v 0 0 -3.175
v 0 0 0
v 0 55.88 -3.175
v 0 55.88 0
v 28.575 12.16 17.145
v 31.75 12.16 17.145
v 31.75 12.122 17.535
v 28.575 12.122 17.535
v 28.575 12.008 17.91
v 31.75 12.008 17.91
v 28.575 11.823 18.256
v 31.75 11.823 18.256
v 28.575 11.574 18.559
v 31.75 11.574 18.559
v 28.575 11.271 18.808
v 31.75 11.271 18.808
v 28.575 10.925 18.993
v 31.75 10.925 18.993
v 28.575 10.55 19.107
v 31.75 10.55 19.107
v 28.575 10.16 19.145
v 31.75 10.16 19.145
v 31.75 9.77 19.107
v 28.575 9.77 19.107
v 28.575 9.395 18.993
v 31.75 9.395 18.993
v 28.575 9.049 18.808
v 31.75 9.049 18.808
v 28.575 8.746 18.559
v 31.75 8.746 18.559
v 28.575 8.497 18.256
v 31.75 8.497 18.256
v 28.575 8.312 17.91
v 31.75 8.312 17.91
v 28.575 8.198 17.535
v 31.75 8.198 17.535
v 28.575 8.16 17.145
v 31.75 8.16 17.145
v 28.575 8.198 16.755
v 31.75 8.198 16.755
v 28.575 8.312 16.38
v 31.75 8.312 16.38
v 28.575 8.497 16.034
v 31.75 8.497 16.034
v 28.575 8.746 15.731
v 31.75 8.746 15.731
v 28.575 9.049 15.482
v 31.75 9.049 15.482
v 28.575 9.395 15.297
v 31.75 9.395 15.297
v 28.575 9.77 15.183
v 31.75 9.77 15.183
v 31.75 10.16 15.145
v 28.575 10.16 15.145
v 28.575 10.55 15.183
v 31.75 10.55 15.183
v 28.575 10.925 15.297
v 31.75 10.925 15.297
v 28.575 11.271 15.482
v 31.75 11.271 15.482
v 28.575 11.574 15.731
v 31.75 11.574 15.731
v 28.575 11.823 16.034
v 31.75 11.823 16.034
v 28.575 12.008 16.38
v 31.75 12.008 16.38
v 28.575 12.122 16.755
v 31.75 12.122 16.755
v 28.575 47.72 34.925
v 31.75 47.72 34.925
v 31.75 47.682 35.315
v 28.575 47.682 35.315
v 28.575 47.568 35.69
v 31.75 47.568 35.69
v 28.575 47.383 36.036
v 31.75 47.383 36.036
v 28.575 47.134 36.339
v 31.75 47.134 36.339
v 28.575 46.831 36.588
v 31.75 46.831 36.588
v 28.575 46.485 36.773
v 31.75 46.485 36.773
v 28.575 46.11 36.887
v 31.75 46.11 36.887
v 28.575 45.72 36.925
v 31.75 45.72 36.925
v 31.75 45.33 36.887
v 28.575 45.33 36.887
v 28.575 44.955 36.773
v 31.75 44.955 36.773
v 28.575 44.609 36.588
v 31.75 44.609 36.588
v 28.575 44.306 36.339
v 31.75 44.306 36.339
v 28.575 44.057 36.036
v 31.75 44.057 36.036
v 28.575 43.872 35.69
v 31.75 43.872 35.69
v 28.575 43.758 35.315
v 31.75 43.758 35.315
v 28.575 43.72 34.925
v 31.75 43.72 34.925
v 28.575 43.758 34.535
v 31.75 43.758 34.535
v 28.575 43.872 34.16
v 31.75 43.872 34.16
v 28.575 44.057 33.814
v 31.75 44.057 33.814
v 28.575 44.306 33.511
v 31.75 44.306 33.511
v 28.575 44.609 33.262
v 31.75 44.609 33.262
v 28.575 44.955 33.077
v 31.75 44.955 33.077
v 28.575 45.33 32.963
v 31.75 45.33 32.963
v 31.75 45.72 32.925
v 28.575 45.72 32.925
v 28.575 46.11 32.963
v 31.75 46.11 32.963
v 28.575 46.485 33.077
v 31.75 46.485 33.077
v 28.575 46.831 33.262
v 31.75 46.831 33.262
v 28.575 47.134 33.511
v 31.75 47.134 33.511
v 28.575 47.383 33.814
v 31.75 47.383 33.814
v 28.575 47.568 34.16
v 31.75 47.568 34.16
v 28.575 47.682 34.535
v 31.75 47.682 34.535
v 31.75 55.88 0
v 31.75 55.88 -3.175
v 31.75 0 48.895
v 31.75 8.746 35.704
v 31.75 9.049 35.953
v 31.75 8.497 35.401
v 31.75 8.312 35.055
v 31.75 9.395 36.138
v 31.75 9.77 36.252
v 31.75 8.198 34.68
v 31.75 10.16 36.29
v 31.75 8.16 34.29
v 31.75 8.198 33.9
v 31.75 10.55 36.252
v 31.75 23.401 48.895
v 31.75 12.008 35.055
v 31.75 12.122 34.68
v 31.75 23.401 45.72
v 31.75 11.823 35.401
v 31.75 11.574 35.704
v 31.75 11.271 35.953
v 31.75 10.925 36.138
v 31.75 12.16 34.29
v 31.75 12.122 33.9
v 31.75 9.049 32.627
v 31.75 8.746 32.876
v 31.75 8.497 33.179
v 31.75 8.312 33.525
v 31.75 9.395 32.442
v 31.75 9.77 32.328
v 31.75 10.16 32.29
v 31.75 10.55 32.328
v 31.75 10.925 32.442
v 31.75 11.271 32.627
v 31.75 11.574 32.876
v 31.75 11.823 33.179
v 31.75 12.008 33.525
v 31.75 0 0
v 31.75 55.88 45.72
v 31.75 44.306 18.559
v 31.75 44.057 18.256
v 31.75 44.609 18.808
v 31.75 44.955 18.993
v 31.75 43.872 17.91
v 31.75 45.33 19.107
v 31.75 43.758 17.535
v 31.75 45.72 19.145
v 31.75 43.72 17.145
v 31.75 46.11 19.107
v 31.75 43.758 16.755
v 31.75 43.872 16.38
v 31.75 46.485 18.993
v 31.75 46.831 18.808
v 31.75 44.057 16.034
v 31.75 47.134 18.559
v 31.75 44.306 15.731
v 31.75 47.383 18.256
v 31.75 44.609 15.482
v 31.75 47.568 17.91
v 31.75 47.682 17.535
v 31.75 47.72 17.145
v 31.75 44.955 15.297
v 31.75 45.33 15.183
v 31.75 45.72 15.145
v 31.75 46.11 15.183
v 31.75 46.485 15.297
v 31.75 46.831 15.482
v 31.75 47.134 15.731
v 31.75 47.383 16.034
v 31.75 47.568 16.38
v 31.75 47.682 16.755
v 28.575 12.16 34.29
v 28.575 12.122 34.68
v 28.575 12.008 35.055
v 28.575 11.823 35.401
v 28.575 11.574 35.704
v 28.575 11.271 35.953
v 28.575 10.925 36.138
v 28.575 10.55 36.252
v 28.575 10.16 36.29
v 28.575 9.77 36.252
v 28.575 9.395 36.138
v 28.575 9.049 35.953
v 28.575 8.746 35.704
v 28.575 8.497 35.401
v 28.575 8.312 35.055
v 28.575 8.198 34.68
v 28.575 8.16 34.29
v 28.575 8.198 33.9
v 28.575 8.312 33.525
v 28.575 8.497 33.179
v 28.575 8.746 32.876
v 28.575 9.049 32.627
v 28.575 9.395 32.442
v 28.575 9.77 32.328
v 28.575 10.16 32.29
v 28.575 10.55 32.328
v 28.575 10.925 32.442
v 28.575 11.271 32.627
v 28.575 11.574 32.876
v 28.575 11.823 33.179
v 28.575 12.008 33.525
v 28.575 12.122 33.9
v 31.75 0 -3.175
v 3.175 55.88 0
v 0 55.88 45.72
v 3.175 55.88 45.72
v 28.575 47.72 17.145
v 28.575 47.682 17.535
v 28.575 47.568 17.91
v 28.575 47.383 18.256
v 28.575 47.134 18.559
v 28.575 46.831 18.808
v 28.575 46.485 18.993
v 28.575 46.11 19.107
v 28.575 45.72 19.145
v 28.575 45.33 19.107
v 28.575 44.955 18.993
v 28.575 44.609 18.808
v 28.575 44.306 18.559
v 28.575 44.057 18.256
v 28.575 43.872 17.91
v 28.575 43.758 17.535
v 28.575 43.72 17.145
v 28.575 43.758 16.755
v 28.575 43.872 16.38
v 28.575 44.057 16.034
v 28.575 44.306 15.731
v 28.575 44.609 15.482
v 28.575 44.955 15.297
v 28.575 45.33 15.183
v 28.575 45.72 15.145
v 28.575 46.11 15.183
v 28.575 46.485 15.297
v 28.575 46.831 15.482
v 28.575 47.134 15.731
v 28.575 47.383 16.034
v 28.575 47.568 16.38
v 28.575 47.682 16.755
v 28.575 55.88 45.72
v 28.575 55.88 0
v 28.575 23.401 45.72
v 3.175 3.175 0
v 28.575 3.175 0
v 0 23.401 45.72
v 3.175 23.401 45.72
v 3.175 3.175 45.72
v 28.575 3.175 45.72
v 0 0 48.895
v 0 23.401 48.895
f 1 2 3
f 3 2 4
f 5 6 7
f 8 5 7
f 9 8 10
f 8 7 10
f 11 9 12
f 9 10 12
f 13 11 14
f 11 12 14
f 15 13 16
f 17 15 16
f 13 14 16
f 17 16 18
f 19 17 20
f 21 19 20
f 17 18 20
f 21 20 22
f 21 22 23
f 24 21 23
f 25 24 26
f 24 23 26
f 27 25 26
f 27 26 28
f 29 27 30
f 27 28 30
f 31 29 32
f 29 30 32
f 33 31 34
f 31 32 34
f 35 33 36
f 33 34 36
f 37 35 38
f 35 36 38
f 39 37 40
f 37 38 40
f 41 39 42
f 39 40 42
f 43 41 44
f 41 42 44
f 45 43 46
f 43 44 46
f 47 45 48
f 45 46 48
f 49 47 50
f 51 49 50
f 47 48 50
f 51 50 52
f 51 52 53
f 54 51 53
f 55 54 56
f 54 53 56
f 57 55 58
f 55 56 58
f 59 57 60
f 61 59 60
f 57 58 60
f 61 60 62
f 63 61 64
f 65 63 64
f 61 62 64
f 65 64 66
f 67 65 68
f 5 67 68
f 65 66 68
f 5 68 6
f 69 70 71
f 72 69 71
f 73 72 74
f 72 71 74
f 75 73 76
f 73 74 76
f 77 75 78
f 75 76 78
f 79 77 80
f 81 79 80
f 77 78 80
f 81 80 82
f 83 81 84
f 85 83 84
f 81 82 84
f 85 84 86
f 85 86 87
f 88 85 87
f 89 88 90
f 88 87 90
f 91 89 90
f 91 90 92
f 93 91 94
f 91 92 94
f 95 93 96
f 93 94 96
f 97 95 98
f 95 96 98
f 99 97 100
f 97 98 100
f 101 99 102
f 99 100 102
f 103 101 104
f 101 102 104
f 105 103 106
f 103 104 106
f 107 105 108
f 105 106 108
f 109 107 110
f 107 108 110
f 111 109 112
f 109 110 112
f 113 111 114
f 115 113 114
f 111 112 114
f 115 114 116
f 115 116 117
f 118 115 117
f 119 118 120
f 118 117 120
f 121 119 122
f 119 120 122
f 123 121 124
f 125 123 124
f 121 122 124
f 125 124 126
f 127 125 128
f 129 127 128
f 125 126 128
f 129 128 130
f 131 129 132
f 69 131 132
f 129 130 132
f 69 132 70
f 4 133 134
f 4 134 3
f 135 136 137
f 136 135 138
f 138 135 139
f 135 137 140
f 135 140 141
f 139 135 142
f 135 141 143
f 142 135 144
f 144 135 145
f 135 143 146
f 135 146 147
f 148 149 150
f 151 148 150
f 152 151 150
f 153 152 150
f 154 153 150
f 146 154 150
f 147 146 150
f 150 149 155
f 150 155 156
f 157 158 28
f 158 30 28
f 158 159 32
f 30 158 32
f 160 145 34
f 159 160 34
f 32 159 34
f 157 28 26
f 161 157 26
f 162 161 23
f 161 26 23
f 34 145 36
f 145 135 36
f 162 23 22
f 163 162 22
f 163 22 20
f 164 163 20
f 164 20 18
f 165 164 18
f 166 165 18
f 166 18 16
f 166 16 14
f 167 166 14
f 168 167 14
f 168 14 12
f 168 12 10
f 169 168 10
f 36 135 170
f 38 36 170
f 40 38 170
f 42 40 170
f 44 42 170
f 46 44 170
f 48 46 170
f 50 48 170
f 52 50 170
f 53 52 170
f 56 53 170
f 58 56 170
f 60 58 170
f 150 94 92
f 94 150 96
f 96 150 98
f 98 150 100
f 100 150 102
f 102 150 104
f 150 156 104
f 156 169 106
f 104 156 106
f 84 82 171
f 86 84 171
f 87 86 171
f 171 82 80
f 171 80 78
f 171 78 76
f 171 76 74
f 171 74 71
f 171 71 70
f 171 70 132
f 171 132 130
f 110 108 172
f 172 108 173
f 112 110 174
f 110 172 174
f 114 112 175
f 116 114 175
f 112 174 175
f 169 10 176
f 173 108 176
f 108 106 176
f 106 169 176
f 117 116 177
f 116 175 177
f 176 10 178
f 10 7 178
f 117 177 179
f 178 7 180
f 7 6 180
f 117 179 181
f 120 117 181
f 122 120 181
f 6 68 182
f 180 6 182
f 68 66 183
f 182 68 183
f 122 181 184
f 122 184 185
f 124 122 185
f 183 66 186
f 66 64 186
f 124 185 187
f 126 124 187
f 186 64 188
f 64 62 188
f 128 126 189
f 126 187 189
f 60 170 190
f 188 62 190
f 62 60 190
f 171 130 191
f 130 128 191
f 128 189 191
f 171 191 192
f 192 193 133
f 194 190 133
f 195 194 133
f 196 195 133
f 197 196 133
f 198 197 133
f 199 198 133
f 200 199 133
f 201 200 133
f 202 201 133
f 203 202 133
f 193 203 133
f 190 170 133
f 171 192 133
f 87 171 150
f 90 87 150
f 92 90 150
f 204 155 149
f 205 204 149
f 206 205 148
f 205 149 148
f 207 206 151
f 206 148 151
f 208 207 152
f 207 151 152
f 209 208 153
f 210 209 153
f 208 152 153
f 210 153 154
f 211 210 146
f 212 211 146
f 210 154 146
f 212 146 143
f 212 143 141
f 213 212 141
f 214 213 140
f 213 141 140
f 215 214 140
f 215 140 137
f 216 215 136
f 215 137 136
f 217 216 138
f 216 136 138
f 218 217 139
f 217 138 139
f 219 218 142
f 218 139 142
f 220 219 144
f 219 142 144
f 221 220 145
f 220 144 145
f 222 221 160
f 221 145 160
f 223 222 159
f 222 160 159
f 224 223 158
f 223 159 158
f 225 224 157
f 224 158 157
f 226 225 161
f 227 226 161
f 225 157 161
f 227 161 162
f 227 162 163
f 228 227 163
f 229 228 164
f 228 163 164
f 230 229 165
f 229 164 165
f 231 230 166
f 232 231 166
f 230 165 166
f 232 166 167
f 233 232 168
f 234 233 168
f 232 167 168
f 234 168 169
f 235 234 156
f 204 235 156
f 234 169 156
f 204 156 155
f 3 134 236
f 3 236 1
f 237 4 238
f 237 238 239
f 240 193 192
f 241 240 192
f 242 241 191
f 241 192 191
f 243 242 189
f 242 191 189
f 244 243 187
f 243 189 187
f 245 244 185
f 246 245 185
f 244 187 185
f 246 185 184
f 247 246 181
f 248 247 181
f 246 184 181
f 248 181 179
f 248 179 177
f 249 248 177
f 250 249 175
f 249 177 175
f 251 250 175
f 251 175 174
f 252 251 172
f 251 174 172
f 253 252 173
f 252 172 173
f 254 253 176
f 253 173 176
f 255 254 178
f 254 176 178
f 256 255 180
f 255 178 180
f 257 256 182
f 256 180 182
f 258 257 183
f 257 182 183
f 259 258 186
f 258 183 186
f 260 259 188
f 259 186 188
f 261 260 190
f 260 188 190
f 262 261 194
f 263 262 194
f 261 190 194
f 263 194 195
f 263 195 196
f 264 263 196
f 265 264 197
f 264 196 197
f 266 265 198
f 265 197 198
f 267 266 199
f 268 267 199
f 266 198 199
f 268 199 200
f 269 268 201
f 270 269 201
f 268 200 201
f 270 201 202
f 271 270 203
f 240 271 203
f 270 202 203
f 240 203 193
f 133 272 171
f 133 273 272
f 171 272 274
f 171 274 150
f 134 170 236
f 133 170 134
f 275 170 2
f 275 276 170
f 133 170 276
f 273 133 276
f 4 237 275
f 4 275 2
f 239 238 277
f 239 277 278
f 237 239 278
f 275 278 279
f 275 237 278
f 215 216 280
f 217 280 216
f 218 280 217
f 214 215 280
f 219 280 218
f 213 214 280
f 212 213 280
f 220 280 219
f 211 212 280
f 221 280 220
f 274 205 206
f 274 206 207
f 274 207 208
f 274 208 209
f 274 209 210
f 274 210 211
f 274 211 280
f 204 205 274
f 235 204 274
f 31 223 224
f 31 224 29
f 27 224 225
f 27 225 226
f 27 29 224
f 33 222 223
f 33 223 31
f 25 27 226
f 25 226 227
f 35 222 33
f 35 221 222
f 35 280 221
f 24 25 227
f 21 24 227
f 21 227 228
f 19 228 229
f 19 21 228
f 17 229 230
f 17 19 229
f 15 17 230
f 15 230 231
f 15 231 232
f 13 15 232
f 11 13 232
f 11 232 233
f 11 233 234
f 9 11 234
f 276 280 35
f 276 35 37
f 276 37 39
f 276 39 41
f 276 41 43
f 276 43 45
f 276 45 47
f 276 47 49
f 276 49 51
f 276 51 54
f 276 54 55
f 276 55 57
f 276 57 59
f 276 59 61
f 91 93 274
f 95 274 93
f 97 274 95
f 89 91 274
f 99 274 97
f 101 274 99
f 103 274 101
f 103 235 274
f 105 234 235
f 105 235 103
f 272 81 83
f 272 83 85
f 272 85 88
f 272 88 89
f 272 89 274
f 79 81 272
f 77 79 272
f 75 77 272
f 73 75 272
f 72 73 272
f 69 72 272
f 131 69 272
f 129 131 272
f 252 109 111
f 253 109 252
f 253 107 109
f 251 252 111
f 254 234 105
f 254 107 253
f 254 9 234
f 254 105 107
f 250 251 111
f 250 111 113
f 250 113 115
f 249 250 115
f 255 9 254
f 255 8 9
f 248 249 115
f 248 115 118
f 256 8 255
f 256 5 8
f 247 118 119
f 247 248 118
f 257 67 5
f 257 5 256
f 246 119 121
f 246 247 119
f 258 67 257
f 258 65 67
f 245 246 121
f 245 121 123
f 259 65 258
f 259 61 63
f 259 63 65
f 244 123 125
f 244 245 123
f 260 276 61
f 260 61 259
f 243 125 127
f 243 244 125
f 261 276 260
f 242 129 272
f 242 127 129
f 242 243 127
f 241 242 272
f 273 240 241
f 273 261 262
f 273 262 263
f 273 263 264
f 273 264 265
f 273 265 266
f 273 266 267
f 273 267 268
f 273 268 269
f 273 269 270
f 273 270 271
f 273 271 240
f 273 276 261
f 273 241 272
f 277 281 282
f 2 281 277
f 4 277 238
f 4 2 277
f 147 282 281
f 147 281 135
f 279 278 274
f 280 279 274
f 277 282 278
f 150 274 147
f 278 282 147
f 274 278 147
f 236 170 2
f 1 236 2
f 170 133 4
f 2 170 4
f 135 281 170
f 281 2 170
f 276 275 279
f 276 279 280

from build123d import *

# Parameters (mm, degrees)
BOSS_EXTRUDE1_DEPTH = 45.72
SKETCH2_W           = 31.75
SKETCH2_H           = 55.88
BOSS_EXTRUDE2_DEPTH = 3.175
SKETCH3_W           = 31.75
SKETCH3_H           = 55.88
SKETCH3_R           = 3.712440594
BOSS_EXTRUDE3_DEPTH = 3.175
SKETCH4_R           = 2
CUT_EXTRUDE1_DEPTH  = 3.175
SKETCH5_W           = 31.75
SKETCH5_H           = 32.479121714
CUT_EXTRUDE2_DEPTH  = 3.175


with BuildPart() as part:
    # Sketch1 → Boss-Extrude1 (new body)
    with BuildSketch(Plane.XY):
        Polygon((0, 0), (0, 55.88), (3.175, 55.88), (3.175, 3.175), (28.575, 3.175), (28.575, 55.88), (31.75, 55.88), (31.75, 0), align=None)
    extrude(amount=BOSS_EXTRUDE1_DEPTH)

    # Sketch3 → Boss-Extrude3 (add)
    with BuildSketch(Plane.XY.offset(45.72)):
        with Locations((15.875, 27.94)):
            Rectangle(SKETCH3_W, SKETCH3_H)
        with Locations((15.875, 40.426288934)):
            Circle(SKETCH3_R, mode=Mode.SUBTRACT)
    extrude(amount=BOSS_EXTRUDE3_DEPTH)

    # Sketch4 → Cut-Extrude1 (cut)
    with BuildSketch(Plane(origin=(31.75, 0, 0), x_dir=(0, 0, -1), z_dir=(1, 0, 0))):
        with Locations((-17.145, 45.72)):
            Circle(SKETCH4_R)
        with Locations((-34.29, 10.16)):
            Circle(SKETCH4_R)
        with Locations((-17.145, 10.16)):
            Circle(SKETCH4_R)
        with Locations((-34.925, 45.72)):
            Circle(SKETCH4_R)
    extrude(amount=-CUT_EXTRUDE1_DEPTH, mode=Mode.SUBTRACT)

    # Sketch5 → Cut-Extrude2 (cut)
    with BuildSketch(Plane.XY.offset(48.895)):
        with Locations((15.875, 39.640439143)):
            Rectangle(SKETCH5_W, SKETCH5_H)
    extrude(amount=-CUT_EXTRUDE2_DEPTH, mode=Mode.SUBTRACT)


with BuildPart() as body_2:
    # Sketch2 → Boss-Extrude2 (new body)
    with BuildSketch(Plane(origin=(0, 0, 0), x_dir=(-1, 0, 0), z_dir=(0, 0, -1))):
        with Locations((-15.875, 27.94)):
            Rectangle(SKETCH2_W, SKETCH2_H)
    extrude(amount=BOSS_EXTRUDE2_DEPTH)


solid = Compound([part.part, body_2.part])
